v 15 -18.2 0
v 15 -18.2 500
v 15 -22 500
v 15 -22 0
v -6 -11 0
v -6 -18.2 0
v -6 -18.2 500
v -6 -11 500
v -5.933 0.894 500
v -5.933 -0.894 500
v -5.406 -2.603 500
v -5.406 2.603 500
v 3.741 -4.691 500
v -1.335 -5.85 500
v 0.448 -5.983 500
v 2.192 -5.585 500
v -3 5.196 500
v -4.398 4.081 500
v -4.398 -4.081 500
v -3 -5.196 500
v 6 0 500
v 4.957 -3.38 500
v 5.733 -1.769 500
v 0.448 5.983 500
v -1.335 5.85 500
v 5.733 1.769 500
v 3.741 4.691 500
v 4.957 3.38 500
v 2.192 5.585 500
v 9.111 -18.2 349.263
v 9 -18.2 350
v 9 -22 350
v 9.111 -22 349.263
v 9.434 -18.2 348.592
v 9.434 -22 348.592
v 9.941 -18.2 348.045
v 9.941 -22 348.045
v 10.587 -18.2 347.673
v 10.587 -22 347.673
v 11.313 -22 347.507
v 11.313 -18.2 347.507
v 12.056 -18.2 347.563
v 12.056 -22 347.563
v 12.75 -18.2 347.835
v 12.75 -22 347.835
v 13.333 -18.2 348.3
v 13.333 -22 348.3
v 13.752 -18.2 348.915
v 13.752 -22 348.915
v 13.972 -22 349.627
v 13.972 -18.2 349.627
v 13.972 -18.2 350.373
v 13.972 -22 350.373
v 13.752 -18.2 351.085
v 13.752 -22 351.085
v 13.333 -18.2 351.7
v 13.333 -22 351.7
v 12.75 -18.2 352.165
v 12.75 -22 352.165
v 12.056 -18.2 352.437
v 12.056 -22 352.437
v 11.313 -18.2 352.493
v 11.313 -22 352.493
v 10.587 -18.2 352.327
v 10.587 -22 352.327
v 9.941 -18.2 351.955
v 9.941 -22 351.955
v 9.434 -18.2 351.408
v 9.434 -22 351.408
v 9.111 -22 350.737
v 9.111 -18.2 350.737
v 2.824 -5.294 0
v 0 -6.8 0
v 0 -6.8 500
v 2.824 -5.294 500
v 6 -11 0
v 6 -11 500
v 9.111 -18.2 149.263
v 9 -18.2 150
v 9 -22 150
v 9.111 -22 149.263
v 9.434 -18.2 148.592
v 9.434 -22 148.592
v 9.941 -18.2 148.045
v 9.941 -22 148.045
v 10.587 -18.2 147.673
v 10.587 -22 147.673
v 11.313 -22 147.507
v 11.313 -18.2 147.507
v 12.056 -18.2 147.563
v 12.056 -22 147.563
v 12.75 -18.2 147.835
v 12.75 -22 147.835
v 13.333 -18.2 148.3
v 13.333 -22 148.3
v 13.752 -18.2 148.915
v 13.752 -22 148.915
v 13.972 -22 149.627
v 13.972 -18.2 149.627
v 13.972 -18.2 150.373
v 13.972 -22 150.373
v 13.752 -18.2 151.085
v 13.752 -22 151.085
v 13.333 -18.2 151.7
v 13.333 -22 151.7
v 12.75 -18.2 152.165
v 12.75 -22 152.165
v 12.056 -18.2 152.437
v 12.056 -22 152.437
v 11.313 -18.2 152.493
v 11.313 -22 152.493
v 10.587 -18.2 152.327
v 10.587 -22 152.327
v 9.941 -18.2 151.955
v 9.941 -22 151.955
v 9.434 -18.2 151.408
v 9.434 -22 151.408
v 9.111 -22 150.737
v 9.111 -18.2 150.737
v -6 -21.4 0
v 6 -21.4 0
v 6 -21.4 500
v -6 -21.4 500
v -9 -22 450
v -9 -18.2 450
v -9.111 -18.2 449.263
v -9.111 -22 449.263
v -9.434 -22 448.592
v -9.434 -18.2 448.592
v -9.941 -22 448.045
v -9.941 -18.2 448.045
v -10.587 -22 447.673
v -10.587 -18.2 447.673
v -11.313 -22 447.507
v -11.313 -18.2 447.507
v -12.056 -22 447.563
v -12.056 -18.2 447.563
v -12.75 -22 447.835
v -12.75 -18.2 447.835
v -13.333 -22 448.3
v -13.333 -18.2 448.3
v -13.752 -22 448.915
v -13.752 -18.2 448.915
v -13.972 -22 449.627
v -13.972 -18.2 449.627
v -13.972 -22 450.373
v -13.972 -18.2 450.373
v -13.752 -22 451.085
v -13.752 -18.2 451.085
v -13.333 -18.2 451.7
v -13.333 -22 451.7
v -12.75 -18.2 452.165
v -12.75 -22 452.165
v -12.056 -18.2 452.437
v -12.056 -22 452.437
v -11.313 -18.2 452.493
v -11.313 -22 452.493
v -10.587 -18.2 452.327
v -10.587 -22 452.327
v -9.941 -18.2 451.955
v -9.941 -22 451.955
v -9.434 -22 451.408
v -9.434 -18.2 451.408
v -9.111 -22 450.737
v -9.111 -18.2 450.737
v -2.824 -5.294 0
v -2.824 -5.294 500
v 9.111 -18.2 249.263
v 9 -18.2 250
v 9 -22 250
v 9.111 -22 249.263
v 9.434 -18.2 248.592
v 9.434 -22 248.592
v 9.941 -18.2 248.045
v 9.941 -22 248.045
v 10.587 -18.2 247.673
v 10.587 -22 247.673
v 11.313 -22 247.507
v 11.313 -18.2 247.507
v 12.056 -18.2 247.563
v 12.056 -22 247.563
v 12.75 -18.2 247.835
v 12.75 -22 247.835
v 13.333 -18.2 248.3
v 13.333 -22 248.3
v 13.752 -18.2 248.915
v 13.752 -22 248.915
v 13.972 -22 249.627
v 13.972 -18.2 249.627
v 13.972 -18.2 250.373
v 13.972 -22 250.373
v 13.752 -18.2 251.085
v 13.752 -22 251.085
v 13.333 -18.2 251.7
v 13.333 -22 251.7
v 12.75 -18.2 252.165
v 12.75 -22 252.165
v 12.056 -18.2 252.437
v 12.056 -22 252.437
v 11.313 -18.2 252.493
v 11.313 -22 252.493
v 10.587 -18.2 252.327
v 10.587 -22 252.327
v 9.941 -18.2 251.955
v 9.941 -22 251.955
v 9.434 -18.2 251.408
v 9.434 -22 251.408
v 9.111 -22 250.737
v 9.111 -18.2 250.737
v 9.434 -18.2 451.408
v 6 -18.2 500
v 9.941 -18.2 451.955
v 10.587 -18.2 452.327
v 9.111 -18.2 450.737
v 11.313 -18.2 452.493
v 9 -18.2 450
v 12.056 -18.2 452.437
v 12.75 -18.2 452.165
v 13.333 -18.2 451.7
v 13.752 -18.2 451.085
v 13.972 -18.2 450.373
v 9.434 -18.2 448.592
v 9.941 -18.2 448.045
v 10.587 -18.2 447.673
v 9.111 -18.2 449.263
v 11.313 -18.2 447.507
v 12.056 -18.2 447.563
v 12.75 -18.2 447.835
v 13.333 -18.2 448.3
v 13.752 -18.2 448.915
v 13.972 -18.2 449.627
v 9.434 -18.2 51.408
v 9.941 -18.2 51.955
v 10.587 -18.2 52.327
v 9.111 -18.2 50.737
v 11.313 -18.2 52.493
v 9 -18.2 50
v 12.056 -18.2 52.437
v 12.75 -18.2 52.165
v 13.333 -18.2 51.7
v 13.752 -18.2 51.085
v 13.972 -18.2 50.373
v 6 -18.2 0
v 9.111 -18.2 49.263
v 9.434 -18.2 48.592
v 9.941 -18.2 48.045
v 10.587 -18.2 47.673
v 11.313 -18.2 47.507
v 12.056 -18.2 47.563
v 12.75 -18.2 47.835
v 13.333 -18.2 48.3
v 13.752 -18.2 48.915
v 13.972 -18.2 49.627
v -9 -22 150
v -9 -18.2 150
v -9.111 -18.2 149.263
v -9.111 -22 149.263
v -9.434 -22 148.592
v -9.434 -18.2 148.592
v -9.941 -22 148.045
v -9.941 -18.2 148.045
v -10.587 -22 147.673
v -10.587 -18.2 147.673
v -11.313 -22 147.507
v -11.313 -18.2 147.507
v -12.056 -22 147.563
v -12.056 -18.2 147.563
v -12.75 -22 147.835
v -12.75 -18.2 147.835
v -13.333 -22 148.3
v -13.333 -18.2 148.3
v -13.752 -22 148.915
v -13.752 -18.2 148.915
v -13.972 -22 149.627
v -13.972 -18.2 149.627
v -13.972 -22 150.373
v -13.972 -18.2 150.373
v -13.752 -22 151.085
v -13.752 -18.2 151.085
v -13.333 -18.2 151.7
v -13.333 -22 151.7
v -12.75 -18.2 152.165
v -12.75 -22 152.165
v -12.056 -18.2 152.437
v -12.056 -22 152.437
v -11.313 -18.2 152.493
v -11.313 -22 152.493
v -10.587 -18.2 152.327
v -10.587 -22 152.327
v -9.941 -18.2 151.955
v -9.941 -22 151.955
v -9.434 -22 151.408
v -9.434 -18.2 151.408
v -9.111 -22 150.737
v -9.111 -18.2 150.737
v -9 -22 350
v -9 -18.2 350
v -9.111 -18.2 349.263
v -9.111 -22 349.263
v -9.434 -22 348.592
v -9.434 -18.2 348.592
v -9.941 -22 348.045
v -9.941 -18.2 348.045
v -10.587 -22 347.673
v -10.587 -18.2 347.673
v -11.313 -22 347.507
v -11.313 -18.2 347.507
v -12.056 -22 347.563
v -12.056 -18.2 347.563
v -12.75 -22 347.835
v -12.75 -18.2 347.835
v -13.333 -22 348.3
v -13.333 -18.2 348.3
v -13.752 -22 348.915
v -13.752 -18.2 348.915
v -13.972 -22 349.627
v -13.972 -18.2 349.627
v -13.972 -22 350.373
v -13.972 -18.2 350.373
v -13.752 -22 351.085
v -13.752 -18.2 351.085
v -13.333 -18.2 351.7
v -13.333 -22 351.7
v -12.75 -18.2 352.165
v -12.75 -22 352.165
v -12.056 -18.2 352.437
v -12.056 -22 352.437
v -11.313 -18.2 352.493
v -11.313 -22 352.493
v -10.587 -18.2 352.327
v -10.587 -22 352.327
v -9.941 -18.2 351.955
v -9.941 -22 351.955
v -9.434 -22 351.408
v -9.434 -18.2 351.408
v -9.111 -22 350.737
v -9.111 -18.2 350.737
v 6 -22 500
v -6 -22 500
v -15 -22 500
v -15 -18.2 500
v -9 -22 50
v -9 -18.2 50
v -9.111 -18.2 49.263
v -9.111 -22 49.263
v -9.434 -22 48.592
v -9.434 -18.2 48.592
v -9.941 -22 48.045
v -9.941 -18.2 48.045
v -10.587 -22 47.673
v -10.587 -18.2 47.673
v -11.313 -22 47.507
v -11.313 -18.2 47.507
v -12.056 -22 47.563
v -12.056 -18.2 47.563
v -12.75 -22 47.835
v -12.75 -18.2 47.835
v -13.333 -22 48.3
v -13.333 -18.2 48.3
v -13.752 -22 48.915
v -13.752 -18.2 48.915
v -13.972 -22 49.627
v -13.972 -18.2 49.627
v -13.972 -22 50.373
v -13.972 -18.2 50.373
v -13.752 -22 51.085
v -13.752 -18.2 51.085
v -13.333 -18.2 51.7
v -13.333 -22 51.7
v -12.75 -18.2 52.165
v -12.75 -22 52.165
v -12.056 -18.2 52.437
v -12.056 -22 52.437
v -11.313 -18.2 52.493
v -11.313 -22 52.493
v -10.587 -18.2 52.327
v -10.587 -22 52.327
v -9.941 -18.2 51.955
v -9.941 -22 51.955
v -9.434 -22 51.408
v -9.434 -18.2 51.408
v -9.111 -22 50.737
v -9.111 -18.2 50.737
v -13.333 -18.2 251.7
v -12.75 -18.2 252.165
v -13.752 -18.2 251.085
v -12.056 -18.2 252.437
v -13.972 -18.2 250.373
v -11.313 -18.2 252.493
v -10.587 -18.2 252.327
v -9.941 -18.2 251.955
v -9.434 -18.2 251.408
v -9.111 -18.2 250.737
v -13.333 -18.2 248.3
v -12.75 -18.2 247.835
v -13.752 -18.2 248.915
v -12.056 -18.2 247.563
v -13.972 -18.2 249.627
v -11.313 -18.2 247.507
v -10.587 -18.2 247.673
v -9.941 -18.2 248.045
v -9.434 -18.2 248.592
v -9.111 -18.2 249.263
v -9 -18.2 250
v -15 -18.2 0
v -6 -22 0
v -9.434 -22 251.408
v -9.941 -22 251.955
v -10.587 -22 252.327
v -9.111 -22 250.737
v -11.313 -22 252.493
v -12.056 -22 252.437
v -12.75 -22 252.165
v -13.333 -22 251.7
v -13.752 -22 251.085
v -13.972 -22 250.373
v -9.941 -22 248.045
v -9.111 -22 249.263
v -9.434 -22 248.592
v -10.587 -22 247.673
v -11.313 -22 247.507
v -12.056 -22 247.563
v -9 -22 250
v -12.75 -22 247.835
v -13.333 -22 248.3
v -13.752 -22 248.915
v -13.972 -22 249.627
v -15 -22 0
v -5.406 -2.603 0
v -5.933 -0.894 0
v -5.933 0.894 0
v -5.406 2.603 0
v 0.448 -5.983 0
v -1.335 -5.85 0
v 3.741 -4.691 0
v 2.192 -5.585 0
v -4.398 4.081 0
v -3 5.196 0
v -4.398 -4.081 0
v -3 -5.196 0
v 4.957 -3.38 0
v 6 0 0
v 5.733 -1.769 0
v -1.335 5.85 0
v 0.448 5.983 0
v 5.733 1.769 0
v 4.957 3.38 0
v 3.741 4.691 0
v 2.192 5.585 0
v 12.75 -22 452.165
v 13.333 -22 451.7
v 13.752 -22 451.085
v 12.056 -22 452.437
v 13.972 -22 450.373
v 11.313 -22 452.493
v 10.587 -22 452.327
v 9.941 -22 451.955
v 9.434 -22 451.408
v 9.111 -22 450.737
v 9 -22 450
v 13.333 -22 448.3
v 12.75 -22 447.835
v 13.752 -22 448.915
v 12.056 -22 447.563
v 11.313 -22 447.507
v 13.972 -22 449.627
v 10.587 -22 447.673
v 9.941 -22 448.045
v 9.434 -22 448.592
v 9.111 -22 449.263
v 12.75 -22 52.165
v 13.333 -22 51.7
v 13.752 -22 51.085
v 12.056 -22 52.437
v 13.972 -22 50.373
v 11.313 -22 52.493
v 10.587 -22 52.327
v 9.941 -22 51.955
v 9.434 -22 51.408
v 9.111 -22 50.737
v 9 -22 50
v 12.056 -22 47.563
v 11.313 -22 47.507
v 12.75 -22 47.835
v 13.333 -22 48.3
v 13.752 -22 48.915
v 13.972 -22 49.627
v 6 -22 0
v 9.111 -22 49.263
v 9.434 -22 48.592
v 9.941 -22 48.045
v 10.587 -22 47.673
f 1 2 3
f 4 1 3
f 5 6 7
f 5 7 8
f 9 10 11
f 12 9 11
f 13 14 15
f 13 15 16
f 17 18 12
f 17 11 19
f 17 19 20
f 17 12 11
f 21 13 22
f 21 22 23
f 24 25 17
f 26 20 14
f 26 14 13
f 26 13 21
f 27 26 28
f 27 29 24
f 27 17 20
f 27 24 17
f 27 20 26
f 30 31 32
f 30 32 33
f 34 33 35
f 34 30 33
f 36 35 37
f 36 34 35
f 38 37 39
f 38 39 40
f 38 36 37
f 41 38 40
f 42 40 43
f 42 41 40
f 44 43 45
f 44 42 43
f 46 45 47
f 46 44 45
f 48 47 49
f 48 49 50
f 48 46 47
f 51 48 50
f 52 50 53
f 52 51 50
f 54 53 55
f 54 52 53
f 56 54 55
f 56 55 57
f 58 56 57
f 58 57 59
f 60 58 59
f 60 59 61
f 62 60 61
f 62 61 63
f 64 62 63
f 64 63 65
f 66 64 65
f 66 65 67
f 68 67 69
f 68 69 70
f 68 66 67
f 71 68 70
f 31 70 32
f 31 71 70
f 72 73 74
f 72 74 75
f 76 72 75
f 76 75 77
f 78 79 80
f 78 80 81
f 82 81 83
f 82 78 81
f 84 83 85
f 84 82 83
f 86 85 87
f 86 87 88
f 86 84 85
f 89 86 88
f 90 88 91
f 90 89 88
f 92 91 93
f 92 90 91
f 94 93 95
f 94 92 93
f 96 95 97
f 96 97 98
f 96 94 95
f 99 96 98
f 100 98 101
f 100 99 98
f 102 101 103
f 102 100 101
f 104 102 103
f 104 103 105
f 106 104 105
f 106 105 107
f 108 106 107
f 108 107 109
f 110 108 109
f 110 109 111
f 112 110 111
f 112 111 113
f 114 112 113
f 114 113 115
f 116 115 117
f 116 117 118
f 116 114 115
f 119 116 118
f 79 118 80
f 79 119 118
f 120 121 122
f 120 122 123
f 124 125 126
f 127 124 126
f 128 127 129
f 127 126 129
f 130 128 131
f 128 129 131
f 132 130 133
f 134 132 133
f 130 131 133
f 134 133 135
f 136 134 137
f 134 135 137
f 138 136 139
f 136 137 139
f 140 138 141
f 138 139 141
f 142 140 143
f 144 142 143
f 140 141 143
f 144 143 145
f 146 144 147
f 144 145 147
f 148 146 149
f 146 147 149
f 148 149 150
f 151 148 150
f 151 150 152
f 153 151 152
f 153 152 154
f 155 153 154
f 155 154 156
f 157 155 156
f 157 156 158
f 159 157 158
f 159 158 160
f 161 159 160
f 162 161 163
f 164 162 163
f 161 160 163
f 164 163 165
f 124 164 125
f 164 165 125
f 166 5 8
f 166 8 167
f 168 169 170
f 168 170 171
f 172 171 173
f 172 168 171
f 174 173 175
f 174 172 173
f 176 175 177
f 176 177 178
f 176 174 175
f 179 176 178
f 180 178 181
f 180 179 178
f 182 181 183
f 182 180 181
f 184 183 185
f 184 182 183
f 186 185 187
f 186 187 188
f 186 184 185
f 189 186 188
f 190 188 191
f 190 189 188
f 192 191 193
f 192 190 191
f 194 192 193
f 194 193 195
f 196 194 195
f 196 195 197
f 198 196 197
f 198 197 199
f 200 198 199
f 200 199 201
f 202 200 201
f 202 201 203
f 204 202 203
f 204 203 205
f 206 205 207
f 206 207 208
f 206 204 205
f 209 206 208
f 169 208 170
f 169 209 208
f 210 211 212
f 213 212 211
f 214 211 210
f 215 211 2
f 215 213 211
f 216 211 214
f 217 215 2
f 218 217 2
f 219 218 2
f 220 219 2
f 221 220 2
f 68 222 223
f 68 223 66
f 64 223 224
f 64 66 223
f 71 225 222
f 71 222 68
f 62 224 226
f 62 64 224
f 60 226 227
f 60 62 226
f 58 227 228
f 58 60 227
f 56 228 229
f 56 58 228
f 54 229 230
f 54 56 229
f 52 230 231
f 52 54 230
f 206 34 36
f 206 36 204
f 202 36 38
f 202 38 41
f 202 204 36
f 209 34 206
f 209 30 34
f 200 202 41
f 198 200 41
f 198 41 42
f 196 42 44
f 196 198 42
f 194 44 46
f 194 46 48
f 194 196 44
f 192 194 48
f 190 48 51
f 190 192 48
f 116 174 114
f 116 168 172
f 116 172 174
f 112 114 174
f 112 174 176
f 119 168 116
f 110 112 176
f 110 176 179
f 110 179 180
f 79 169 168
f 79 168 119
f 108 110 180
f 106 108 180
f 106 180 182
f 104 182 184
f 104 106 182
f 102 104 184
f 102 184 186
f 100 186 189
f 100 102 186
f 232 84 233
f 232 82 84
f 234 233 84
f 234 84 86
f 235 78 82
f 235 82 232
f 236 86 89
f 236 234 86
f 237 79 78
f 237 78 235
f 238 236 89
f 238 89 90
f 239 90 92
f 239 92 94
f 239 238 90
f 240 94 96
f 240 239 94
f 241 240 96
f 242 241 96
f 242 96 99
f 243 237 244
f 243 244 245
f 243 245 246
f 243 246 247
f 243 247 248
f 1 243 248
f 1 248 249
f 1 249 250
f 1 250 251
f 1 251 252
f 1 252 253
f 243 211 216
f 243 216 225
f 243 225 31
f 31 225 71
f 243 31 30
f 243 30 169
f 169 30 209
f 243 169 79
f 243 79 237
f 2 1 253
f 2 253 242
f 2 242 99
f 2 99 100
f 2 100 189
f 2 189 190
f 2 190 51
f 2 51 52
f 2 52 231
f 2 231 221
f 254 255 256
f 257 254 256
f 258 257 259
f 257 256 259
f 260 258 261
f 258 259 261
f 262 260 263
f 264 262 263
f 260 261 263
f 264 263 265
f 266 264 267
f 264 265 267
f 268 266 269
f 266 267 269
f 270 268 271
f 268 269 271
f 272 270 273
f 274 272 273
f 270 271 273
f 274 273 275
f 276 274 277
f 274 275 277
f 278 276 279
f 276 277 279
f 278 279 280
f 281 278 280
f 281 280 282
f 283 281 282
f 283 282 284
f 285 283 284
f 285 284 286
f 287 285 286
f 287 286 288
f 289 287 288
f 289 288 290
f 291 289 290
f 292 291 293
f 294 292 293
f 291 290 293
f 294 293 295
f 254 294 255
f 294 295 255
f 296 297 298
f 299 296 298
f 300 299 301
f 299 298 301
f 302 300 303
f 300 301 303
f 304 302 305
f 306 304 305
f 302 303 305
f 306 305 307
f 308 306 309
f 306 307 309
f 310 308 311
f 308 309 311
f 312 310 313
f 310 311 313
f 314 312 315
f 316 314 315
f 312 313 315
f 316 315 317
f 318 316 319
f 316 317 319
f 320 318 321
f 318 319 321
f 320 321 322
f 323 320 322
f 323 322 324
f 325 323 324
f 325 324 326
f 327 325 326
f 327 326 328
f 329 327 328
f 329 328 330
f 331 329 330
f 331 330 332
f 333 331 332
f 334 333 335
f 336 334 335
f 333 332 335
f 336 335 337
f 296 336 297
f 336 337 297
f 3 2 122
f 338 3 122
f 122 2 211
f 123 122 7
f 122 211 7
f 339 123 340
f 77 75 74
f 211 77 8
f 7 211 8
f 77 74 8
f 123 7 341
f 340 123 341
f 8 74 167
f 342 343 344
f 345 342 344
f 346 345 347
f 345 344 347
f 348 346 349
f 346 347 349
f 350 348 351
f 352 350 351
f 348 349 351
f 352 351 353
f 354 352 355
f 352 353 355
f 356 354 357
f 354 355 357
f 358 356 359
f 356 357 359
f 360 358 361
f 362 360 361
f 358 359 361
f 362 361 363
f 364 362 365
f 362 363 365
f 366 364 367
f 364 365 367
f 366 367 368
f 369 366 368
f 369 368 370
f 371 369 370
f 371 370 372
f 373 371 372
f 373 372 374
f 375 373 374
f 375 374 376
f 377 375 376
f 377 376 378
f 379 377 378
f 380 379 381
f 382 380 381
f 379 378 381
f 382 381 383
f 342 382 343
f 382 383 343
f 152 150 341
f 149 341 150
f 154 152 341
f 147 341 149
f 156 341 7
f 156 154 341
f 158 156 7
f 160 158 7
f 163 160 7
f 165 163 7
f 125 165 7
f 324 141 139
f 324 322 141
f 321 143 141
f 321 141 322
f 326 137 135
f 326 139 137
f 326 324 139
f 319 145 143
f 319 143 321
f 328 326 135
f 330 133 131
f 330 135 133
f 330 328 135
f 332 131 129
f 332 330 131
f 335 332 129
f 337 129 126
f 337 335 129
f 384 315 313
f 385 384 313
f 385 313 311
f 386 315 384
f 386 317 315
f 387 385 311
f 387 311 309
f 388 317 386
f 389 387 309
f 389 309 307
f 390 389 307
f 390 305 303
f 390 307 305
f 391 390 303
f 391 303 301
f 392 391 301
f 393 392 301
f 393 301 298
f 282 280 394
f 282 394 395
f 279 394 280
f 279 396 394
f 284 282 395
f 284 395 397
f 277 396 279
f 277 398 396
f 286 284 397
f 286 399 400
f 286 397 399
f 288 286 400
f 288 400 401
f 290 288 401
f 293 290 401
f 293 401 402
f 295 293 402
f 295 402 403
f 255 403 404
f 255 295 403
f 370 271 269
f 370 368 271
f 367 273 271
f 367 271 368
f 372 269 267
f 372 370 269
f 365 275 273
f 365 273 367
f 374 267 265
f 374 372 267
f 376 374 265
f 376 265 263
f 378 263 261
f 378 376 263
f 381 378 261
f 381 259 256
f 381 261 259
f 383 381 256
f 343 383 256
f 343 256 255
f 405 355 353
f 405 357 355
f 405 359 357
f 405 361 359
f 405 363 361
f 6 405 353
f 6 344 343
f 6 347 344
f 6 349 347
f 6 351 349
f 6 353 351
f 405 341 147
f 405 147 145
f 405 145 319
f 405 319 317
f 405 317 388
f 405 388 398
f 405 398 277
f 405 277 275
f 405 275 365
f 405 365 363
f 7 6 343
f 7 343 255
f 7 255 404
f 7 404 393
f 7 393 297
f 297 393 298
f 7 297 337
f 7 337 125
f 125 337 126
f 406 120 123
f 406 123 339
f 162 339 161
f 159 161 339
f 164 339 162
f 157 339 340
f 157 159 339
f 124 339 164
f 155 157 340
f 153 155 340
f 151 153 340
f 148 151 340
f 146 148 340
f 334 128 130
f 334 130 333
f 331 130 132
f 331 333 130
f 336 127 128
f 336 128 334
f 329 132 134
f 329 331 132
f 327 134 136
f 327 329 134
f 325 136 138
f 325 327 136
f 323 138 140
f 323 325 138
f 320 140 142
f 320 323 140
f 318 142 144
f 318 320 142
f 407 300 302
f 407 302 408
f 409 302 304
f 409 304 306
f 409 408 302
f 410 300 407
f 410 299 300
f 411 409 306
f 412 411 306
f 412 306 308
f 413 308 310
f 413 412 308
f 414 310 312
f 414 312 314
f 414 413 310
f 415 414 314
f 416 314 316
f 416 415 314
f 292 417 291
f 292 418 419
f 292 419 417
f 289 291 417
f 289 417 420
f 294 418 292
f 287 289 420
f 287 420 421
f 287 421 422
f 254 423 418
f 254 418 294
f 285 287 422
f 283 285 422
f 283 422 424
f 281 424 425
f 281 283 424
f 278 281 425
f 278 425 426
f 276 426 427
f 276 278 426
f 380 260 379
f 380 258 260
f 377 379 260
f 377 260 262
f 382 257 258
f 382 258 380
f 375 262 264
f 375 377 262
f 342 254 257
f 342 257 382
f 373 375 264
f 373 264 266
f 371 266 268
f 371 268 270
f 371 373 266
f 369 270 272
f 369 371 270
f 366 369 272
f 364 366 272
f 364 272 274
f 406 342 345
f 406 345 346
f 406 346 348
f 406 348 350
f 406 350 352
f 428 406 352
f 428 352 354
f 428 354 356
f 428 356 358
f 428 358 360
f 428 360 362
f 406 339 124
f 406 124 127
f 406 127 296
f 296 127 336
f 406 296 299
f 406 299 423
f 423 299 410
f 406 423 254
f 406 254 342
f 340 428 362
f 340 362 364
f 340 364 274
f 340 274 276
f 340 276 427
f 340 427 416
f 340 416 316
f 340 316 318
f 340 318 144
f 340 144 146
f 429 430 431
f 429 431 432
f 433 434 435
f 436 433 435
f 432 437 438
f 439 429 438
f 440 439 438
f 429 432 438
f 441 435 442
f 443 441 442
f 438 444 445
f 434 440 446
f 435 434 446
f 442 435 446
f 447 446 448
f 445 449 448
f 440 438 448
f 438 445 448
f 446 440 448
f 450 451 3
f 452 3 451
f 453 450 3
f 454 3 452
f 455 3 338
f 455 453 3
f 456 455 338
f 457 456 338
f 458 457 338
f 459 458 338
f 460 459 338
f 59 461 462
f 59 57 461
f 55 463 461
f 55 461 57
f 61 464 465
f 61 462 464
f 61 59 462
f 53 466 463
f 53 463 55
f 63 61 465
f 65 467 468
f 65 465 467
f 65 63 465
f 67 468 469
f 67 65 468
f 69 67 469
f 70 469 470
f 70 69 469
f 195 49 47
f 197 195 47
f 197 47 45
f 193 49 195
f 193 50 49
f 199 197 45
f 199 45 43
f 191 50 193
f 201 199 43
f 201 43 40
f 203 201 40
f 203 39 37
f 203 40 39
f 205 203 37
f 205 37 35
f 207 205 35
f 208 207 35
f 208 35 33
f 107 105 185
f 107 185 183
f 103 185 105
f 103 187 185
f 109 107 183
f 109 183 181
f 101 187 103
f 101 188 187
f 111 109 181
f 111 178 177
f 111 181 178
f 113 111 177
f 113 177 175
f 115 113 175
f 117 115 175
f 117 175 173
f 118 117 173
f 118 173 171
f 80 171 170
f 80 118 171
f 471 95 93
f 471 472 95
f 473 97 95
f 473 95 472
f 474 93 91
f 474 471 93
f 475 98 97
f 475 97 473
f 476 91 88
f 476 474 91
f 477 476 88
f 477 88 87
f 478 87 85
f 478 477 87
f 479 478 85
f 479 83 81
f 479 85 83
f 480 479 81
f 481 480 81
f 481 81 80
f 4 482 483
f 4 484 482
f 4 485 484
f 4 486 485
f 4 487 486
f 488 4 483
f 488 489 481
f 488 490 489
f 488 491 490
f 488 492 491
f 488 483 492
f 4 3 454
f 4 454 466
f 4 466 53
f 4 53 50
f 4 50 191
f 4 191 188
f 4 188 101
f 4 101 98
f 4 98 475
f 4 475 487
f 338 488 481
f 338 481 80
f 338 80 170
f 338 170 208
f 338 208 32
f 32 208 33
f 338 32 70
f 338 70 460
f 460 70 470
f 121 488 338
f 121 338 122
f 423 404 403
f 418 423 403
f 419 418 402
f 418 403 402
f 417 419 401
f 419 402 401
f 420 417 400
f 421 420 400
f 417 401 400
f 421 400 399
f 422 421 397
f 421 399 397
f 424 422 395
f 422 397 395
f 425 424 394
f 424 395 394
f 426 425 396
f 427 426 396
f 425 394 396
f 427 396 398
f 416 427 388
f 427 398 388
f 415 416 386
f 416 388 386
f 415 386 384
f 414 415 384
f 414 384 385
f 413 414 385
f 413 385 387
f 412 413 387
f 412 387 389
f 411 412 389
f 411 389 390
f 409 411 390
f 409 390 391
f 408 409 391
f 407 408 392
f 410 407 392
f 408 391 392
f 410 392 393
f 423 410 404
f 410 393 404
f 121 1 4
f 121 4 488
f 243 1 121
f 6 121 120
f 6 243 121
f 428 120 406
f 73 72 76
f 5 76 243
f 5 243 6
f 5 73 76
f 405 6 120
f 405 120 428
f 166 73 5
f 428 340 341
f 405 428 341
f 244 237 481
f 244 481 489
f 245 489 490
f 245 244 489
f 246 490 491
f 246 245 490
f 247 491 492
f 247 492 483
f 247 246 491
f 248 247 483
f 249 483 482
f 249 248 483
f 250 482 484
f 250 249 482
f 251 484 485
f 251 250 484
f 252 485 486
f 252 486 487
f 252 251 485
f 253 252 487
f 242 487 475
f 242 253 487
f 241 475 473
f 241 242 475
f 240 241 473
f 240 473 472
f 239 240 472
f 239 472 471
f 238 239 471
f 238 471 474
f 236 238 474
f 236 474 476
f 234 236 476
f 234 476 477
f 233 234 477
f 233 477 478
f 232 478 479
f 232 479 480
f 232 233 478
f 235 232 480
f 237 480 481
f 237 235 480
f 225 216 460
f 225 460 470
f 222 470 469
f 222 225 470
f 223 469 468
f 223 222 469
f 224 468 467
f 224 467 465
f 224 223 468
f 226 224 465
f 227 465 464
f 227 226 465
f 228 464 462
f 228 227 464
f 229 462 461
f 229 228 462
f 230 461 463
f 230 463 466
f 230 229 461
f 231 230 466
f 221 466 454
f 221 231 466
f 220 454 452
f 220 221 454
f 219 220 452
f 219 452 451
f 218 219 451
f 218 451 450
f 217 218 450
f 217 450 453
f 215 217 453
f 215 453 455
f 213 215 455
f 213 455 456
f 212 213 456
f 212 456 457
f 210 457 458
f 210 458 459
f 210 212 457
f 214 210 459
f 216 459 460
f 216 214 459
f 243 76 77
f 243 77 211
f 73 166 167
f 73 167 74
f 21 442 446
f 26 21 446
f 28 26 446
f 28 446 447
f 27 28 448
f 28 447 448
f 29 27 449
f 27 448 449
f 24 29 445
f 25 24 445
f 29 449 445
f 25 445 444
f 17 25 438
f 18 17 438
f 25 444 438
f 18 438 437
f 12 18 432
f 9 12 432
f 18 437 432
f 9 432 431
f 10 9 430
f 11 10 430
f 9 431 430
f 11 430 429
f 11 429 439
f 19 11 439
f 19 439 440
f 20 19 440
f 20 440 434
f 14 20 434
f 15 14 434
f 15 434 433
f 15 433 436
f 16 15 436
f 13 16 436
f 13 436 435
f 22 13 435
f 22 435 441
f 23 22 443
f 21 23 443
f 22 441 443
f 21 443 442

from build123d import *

# Parameters (mm, degrees)
SALIENTE_EXTRUIR1_DEPTH   = 500
CROQUIS1_R                = 6
SALIENTE_EXTRUIR1_2_DEPTH = 500
CROQUIS2_R                = 2.5
CORTAR_EXTRUIR1_DEPTH     = 3.8


with BuildPart() as part:
    # Croquis1 → Saliente-Extruir1 (new body)
    with BuildSketch(Plane.XY):
        Polygon((0, -6.8), (2.823529412, -5.294117647), (6, -11), (6, -18.2), (15, -18.2), (15, -22), (6, -22), (6, -21.4), (-6, -21.4), (-6, -22), (-15, -22), (-15, -18.2), (-6, -18.2), (-6, -11), (-2.823529412, -5.294117647), align=None)
    extrude(amount=SALIENTE_EXTRUIR1_DEPTH)

    # Croquis2 → Cortar-Extruir1 (cut)
    with BuildSketch(Plane(origin=(0, -18.2, 0), x_dir=(1, 0, 0), z_dir=(0, 1, 0))):
        with Locations((-11.5, -50)):
            Circle(CROQUIS2_R)
        with Locations((-11.5, -150)):
            Circle(CROQUIS2_R)
        with Locations((-11.5, -250)):
            Circle(CROQUIS2_R)
        with Locations((-11.5, -350)):
            Circle(CROQUIS2_R)
        with Locations((-11.5, -450)):
            Circle(CROQUIS2_R)
    cortar_extruir1 = extrude(amount=-CORTAR_EXTRUIR1_DEPTH, mode=Mode.SUBTRACT)

    # Simetría1: Cortar-Extruir1 across plane
    add(cortar_extruir1.mirror(Plane(origin=(0, 0, 0), x_dir=(0, 0, 1), z_dir=(1, 0, 0))), mode=Mode.SUBTRACT)


with BuildPart() as body_2:
    # Croquis1 → Saliente-Extruir1 2 (new body)
    with BuildSketch(Plane.XY):
        Circle(CROQUIS1_R)
    extrude(amount=SALIENTE_EXTRUIR1_2_DEPTH)


solid = Compound([part.part, body_2.part])
